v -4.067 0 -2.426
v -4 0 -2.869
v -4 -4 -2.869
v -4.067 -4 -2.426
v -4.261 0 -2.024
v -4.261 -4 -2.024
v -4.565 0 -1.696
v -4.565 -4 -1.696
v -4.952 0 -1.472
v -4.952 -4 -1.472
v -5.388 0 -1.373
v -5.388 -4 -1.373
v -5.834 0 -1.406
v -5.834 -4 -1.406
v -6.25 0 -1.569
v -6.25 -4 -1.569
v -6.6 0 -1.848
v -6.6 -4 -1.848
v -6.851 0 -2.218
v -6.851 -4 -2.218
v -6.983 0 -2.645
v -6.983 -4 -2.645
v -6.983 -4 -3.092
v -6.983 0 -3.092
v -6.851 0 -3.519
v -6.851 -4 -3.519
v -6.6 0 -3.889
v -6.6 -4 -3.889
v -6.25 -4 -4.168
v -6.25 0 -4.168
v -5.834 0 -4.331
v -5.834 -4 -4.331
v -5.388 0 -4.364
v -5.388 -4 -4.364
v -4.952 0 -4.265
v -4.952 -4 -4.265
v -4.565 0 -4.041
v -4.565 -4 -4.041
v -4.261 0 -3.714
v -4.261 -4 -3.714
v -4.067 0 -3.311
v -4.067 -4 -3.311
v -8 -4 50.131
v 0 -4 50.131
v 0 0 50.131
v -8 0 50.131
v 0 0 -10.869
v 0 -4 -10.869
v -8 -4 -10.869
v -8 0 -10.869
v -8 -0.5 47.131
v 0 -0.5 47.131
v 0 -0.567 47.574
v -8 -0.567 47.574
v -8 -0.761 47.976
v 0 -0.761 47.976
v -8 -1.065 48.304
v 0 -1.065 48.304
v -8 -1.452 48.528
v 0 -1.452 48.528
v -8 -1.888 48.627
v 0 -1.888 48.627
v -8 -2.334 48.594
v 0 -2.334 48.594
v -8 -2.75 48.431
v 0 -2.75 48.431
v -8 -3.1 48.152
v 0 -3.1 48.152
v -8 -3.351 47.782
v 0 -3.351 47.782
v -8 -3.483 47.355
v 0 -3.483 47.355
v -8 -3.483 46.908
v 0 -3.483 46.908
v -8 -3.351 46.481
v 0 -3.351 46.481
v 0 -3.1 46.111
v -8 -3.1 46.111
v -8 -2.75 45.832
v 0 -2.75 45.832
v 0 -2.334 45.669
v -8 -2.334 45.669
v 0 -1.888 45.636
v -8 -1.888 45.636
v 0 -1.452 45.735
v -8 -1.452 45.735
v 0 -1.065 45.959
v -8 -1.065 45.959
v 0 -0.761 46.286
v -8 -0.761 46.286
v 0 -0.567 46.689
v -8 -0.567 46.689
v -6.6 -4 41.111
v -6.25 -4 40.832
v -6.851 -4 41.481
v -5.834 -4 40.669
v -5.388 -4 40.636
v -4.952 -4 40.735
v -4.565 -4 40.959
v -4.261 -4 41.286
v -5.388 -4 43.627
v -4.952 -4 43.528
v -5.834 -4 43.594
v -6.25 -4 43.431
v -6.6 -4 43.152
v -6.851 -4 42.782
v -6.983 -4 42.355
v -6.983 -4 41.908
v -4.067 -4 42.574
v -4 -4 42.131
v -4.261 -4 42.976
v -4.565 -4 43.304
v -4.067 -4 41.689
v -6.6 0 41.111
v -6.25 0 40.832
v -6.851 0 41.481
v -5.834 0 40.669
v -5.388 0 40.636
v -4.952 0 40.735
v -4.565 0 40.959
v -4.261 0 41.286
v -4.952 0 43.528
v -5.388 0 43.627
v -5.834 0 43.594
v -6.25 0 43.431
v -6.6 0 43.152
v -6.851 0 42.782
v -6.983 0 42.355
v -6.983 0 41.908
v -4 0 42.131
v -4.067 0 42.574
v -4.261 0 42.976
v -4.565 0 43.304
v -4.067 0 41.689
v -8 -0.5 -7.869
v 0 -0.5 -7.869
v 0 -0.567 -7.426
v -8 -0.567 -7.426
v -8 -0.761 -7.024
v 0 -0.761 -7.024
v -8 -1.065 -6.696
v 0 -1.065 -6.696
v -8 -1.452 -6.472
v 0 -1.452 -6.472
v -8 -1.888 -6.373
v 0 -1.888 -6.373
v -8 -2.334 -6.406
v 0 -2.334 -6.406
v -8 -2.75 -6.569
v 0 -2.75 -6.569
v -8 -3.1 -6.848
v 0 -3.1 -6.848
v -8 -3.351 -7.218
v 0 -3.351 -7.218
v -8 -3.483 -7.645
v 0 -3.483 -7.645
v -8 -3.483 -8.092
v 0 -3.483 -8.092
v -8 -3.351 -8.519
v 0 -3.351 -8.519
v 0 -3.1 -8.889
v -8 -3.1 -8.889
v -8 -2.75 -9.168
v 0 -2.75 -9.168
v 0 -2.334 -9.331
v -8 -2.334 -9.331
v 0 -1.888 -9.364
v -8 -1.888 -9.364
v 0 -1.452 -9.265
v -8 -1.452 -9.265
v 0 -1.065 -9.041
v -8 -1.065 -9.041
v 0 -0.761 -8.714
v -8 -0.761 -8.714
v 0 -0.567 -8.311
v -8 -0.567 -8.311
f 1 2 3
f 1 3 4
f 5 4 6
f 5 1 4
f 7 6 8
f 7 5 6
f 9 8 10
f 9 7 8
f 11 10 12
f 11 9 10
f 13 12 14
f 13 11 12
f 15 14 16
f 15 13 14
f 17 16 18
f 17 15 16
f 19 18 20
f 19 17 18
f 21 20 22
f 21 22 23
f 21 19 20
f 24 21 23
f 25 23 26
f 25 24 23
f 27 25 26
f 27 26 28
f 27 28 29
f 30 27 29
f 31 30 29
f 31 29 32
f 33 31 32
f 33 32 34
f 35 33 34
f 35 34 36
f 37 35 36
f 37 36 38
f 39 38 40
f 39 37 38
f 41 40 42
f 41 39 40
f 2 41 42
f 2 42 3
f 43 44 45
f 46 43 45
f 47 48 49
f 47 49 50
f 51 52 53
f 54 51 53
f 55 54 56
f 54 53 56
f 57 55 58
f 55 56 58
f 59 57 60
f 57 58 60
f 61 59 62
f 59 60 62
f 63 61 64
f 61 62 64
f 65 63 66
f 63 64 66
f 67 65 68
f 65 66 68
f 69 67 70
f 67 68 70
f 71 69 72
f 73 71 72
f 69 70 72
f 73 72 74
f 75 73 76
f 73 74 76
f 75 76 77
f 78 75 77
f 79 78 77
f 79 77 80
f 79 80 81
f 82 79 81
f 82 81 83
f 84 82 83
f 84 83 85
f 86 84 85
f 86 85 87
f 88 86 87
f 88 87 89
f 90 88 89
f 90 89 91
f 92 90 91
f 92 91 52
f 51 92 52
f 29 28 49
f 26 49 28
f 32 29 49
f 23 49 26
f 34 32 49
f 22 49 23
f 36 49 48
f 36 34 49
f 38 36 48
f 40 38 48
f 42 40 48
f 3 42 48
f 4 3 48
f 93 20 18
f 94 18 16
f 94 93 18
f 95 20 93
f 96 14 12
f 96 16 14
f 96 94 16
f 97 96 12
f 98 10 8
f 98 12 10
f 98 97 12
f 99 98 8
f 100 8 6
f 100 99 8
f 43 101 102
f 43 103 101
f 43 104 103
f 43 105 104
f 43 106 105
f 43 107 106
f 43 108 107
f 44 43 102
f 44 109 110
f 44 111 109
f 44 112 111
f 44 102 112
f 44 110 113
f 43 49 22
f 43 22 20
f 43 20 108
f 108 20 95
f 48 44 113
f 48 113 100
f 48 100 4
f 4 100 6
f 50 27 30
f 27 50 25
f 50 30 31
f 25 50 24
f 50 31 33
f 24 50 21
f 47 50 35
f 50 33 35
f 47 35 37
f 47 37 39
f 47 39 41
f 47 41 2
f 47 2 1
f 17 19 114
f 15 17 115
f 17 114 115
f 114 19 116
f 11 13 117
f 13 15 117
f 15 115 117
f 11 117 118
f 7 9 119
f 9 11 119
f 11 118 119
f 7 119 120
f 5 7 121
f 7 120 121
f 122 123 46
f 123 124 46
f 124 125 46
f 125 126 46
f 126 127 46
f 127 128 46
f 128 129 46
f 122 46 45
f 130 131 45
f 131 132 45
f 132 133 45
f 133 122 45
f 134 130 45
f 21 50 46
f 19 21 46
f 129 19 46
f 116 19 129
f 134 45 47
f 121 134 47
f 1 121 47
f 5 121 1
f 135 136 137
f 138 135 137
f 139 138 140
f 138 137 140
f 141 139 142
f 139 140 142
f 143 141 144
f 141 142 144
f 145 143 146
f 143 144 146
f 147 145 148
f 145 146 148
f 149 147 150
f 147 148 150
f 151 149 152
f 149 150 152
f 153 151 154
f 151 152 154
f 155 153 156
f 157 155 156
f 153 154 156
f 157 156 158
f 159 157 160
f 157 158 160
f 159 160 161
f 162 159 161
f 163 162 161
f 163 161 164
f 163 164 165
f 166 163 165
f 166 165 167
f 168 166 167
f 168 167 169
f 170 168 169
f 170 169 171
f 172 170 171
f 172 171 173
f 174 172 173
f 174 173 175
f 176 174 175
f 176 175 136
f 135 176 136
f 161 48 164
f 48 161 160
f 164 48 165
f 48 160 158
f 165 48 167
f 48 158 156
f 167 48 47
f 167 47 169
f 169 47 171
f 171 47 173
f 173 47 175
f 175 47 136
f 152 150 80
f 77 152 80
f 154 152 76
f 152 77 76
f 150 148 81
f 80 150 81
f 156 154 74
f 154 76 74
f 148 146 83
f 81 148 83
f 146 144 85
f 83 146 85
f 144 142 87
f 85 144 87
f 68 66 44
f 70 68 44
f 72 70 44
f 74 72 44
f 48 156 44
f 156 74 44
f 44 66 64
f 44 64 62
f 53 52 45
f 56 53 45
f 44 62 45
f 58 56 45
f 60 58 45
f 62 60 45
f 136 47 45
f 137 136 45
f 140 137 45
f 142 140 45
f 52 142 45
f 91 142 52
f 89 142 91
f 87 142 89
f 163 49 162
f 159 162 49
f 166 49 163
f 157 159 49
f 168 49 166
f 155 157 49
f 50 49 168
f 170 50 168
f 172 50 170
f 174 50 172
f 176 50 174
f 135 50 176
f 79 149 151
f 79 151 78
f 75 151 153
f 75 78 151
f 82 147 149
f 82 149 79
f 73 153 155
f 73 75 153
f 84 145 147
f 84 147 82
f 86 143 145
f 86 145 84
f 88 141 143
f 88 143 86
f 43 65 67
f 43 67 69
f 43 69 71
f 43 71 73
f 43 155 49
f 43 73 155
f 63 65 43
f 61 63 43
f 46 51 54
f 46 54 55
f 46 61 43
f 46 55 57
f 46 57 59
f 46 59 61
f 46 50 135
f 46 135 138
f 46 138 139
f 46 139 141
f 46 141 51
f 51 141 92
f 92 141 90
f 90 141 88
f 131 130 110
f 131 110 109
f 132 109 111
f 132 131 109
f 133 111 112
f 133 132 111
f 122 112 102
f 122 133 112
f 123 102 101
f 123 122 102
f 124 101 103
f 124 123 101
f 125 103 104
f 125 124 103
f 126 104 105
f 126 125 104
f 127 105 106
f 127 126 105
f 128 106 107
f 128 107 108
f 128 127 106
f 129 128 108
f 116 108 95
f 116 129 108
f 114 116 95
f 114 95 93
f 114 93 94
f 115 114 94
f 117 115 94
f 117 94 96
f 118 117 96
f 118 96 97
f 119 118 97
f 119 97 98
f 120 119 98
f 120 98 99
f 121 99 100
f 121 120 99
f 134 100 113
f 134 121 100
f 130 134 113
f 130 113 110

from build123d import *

# Parameters (mm, degrees)
F0_W     = 8
F0_H     = 65
F0_R     = 1.5
F1_DEPTH = 4
F2_R     = 1.5
F3_DEPTH = 25
F4_W     = 9.591324
F4_H     = 3.160866
F4_W_2   = 9.216423
F4_H_2   = 3.027778
F5_DEPTH = 25


with BuildPart() as f1:
    # F0 (on Front) → F1 (new body)
    with BuildSketch(Plane.XZ):
        with Locations((-4, 19.631475)):
            Rectangle(F0_W, F0_H)
        with Locations((-5.5, -2.868525)):
            Circle(F0_R, mode=Mode.SUBTRACT)
        with Locations((-5.5, 42.131475)):
            Circle(F0_R, mode=Mode.SUBTRACT)
    extrude(amount=F1_DEPTH)

    # F2 (on face) → F3 (cut)
    with BuildSketch(Plane.YZ):
        with Locations((-2, 47.131475)):
            Circle(F2_R)
        with Locations((-2, -7.868525)):
            Circle(F2_R)
    extrude(amount=-F3_DEPTH, mode=Mode.SUBTRACT)

    # F4 (on face) → F5 (cut)
    with BuildSketch(Plane.YZ):
        with Locations((-2.453811, 51.711908)):
            Rectangle(F4_W, F4_H)
        with Locations((-0.403113, -12.382414)):
            Rectangle(F4_W_2, F4_H_2)
    extrude(amount=-F5_DEPTH, mode=Mode.SUBTRACT)


solid = f1.part
